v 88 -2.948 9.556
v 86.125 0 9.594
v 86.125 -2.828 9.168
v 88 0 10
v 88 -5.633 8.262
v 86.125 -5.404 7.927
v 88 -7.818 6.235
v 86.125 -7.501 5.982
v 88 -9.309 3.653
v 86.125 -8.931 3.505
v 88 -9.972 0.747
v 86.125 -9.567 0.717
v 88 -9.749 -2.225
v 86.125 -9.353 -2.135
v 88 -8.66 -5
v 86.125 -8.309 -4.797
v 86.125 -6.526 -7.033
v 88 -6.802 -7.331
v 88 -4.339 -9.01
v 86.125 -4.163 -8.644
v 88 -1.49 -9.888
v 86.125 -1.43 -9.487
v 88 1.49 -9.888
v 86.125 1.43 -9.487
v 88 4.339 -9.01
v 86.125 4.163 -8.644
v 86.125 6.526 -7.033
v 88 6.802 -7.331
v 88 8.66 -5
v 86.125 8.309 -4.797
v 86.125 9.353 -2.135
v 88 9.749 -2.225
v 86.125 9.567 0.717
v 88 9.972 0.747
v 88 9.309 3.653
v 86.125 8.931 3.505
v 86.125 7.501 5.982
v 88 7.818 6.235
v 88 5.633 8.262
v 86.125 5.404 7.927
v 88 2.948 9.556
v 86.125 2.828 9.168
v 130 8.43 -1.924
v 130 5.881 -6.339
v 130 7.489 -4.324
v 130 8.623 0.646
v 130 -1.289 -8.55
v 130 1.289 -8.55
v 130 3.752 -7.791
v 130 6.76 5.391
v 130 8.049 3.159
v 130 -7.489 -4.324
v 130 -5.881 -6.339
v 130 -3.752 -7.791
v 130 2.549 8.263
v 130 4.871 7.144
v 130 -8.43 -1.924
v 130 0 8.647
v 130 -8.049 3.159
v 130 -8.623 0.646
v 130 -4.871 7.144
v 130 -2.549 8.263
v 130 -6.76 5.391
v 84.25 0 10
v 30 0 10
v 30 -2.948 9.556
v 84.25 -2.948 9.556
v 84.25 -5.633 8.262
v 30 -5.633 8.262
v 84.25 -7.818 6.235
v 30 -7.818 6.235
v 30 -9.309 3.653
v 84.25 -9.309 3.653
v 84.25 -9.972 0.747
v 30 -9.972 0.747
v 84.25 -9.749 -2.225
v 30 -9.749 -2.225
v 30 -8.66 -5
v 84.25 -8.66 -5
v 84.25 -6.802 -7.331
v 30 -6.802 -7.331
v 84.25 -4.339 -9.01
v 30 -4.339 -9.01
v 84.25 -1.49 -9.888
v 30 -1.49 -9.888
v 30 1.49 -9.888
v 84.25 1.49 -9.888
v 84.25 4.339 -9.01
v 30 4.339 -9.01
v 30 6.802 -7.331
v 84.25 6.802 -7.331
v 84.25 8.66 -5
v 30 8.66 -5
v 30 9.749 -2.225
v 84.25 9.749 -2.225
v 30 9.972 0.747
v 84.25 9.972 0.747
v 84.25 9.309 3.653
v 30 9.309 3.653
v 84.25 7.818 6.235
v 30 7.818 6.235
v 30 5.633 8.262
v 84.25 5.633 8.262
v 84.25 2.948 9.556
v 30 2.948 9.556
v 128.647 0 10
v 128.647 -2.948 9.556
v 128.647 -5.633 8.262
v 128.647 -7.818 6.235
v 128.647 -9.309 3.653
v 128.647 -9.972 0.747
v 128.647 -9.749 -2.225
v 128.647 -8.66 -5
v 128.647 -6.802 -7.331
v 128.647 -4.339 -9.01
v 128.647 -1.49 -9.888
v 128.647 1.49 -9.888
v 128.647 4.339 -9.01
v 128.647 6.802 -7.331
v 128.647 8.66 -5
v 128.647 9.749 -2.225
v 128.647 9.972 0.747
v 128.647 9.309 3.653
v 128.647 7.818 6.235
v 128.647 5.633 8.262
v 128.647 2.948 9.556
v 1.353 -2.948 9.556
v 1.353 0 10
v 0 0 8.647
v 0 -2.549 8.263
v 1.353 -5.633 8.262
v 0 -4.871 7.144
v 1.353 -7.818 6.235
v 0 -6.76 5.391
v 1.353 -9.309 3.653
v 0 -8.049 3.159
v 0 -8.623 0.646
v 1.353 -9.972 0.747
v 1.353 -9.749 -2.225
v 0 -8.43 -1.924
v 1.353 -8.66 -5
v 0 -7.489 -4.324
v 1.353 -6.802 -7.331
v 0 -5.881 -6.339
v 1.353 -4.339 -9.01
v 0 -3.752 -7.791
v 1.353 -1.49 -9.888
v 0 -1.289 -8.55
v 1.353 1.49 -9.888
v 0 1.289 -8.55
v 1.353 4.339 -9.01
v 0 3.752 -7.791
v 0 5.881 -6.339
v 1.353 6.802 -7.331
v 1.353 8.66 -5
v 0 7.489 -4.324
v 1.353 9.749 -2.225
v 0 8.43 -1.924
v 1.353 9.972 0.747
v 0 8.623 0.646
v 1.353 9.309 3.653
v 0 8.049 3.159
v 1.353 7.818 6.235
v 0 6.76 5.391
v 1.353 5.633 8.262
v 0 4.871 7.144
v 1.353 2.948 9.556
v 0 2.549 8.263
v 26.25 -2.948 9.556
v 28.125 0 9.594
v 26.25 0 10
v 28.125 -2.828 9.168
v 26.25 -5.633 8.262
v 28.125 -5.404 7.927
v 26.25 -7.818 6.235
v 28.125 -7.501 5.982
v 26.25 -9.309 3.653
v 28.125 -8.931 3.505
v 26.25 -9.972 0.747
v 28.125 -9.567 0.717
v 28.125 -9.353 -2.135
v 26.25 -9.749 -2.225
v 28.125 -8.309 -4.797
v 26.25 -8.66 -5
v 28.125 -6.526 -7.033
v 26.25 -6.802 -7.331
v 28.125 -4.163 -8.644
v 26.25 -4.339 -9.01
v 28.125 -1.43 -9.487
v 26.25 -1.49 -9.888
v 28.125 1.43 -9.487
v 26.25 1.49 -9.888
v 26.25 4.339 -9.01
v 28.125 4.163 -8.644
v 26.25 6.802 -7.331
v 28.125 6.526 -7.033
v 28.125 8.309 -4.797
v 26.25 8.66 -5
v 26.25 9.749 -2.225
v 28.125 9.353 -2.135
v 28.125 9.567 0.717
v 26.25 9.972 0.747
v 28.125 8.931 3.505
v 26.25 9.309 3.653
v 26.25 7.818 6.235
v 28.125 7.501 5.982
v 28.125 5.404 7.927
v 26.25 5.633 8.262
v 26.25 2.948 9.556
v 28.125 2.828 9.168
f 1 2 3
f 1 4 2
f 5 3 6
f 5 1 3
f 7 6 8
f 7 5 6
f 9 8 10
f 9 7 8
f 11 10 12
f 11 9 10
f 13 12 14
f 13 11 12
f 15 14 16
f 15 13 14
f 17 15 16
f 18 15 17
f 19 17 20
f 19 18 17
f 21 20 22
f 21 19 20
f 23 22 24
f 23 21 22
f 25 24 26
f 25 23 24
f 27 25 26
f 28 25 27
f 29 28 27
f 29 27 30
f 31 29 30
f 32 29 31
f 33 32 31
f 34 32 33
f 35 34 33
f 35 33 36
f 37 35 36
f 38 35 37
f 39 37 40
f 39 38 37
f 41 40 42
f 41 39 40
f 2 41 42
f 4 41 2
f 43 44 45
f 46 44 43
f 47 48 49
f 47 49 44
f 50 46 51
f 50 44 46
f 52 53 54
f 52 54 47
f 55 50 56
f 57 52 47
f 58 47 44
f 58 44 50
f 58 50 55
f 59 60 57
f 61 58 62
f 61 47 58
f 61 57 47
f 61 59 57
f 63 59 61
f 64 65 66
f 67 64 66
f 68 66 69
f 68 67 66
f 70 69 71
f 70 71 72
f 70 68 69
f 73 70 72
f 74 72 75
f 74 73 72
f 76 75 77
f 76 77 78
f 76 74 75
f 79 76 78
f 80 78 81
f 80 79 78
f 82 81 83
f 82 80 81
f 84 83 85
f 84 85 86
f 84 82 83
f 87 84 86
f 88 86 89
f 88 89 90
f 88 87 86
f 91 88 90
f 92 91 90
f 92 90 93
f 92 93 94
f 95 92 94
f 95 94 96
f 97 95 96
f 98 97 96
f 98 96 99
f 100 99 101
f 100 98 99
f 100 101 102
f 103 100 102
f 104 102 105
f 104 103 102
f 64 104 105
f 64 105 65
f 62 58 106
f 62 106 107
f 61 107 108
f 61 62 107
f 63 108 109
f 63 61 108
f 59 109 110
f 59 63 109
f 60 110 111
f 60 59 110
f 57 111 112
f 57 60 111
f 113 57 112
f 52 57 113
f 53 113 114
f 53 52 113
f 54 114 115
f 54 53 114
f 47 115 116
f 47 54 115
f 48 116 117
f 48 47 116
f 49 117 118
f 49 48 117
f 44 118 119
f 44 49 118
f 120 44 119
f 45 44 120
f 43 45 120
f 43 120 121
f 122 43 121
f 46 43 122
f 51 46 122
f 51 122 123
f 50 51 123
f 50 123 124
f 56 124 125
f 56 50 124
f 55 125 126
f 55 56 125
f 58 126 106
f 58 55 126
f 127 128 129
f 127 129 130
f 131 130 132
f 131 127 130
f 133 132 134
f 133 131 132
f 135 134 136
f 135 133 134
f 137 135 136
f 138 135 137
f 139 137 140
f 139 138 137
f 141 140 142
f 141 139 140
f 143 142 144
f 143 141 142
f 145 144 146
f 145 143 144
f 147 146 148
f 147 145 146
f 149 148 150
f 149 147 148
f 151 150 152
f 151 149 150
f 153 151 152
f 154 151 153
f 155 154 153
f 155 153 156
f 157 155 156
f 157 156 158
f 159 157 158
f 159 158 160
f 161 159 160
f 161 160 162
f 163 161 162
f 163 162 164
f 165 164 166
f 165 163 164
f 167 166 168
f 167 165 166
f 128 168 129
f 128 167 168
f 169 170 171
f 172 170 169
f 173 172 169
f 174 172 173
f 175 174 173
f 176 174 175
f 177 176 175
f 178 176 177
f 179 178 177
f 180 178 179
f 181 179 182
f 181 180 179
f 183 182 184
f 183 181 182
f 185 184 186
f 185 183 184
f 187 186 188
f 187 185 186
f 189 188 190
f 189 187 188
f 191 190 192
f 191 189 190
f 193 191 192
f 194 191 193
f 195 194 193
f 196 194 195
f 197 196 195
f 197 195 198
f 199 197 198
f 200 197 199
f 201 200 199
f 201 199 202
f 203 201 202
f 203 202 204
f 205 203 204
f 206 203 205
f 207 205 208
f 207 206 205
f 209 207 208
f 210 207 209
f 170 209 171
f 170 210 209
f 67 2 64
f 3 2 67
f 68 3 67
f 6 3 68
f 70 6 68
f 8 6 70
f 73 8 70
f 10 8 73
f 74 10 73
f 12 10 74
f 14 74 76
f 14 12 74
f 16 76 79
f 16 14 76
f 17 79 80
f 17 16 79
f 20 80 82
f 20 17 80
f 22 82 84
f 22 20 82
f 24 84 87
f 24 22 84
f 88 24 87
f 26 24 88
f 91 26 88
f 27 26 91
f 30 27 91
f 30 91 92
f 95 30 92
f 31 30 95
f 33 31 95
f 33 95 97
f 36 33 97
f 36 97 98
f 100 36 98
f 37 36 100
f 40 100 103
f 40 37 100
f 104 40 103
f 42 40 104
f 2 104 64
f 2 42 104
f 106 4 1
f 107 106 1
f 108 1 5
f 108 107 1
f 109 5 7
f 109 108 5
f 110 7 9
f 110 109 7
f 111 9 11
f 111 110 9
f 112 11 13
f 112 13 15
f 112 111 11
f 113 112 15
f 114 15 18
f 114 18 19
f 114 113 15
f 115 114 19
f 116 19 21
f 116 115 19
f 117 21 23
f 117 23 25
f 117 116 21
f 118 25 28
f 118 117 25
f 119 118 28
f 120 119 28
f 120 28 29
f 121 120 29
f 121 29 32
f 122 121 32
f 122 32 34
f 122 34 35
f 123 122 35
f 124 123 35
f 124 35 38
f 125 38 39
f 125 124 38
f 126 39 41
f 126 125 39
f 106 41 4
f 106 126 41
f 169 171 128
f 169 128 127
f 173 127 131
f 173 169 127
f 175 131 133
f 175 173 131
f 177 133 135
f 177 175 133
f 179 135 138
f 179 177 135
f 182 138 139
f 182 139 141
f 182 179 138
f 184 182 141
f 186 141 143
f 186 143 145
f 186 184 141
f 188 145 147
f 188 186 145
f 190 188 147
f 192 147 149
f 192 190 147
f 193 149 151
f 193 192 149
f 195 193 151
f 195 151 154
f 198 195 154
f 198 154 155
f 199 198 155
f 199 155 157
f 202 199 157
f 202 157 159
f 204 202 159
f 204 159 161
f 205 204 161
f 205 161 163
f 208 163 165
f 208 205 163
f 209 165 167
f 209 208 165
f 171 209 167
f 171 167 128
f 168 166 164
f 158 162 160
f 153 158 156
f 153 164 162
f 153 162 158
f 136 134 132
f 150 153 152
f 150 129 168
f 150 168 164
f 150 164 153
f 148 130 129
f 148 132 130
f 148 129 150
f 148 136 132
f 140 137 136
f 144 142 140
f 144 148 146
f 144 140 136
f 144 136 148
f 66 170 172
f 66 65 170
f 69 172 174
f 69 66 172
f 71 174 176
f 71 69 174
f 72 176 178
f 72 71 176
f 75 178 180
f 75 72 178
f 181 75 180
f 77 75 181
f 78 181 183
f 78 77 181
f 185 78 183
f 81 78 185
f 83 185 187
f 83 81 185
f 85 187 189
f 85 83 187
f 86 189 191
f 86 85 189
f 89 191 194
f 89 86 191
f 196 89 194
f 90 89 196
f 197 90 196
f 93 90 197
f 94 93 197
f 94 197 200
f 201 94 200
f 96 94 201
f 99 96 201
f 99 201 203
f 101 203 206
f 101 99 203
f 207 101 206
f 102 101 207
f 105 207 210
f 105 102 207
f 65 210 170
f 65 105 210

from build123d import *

# Parameters (mm, degrees)
HEADCHAMFER_SIZE = 1.353


with BuildPart() as part:
    # Sketch1 → BaseHead (revolve)
    with BuildSketch(Plane.XY, mode=Mode.PRIVATE) as basehead_sk:
        Polygon((0, 0), (0, 10), (26.25, 10), (30, 9.188), (84.25, 9.188), (88, 10), (130, 10), (130, 0), align=None)
    revolve(basehead_sk.sketch.rotate(Axis((-1.310841664, 0, 0), (1, 0, 0)), 90), axis=Axis((-1.310841664, 0, 0), (1, 0, 0)))

    # HeadChamfer
    headchamfer_edges = [part.edges().sort_by_distance(p)[0] for p in [
        (130, 0, -10),
        (0, 0, -10),
    ]]
    chamfer(headchamfer_edges, length=HEADCHAMFER_SIZE)

    # Sketch2 → BaseBody (revolve)
    with BuildSketch(Plane.XY, mode=Mode.PRIVATE) as basebody_sk:
        Polygon((26.25, 9.188), (30, 10), (84.25, 10), (88, 9.188), align=None)
    revolve(basebody_sk.sketch.rotate(Axis((-1.310841664, 0, 0), (1, 0, 0)), 90), axis=Axis((-1.310841664, 0, 0), (1, 0, 0)))


solid = part.part
